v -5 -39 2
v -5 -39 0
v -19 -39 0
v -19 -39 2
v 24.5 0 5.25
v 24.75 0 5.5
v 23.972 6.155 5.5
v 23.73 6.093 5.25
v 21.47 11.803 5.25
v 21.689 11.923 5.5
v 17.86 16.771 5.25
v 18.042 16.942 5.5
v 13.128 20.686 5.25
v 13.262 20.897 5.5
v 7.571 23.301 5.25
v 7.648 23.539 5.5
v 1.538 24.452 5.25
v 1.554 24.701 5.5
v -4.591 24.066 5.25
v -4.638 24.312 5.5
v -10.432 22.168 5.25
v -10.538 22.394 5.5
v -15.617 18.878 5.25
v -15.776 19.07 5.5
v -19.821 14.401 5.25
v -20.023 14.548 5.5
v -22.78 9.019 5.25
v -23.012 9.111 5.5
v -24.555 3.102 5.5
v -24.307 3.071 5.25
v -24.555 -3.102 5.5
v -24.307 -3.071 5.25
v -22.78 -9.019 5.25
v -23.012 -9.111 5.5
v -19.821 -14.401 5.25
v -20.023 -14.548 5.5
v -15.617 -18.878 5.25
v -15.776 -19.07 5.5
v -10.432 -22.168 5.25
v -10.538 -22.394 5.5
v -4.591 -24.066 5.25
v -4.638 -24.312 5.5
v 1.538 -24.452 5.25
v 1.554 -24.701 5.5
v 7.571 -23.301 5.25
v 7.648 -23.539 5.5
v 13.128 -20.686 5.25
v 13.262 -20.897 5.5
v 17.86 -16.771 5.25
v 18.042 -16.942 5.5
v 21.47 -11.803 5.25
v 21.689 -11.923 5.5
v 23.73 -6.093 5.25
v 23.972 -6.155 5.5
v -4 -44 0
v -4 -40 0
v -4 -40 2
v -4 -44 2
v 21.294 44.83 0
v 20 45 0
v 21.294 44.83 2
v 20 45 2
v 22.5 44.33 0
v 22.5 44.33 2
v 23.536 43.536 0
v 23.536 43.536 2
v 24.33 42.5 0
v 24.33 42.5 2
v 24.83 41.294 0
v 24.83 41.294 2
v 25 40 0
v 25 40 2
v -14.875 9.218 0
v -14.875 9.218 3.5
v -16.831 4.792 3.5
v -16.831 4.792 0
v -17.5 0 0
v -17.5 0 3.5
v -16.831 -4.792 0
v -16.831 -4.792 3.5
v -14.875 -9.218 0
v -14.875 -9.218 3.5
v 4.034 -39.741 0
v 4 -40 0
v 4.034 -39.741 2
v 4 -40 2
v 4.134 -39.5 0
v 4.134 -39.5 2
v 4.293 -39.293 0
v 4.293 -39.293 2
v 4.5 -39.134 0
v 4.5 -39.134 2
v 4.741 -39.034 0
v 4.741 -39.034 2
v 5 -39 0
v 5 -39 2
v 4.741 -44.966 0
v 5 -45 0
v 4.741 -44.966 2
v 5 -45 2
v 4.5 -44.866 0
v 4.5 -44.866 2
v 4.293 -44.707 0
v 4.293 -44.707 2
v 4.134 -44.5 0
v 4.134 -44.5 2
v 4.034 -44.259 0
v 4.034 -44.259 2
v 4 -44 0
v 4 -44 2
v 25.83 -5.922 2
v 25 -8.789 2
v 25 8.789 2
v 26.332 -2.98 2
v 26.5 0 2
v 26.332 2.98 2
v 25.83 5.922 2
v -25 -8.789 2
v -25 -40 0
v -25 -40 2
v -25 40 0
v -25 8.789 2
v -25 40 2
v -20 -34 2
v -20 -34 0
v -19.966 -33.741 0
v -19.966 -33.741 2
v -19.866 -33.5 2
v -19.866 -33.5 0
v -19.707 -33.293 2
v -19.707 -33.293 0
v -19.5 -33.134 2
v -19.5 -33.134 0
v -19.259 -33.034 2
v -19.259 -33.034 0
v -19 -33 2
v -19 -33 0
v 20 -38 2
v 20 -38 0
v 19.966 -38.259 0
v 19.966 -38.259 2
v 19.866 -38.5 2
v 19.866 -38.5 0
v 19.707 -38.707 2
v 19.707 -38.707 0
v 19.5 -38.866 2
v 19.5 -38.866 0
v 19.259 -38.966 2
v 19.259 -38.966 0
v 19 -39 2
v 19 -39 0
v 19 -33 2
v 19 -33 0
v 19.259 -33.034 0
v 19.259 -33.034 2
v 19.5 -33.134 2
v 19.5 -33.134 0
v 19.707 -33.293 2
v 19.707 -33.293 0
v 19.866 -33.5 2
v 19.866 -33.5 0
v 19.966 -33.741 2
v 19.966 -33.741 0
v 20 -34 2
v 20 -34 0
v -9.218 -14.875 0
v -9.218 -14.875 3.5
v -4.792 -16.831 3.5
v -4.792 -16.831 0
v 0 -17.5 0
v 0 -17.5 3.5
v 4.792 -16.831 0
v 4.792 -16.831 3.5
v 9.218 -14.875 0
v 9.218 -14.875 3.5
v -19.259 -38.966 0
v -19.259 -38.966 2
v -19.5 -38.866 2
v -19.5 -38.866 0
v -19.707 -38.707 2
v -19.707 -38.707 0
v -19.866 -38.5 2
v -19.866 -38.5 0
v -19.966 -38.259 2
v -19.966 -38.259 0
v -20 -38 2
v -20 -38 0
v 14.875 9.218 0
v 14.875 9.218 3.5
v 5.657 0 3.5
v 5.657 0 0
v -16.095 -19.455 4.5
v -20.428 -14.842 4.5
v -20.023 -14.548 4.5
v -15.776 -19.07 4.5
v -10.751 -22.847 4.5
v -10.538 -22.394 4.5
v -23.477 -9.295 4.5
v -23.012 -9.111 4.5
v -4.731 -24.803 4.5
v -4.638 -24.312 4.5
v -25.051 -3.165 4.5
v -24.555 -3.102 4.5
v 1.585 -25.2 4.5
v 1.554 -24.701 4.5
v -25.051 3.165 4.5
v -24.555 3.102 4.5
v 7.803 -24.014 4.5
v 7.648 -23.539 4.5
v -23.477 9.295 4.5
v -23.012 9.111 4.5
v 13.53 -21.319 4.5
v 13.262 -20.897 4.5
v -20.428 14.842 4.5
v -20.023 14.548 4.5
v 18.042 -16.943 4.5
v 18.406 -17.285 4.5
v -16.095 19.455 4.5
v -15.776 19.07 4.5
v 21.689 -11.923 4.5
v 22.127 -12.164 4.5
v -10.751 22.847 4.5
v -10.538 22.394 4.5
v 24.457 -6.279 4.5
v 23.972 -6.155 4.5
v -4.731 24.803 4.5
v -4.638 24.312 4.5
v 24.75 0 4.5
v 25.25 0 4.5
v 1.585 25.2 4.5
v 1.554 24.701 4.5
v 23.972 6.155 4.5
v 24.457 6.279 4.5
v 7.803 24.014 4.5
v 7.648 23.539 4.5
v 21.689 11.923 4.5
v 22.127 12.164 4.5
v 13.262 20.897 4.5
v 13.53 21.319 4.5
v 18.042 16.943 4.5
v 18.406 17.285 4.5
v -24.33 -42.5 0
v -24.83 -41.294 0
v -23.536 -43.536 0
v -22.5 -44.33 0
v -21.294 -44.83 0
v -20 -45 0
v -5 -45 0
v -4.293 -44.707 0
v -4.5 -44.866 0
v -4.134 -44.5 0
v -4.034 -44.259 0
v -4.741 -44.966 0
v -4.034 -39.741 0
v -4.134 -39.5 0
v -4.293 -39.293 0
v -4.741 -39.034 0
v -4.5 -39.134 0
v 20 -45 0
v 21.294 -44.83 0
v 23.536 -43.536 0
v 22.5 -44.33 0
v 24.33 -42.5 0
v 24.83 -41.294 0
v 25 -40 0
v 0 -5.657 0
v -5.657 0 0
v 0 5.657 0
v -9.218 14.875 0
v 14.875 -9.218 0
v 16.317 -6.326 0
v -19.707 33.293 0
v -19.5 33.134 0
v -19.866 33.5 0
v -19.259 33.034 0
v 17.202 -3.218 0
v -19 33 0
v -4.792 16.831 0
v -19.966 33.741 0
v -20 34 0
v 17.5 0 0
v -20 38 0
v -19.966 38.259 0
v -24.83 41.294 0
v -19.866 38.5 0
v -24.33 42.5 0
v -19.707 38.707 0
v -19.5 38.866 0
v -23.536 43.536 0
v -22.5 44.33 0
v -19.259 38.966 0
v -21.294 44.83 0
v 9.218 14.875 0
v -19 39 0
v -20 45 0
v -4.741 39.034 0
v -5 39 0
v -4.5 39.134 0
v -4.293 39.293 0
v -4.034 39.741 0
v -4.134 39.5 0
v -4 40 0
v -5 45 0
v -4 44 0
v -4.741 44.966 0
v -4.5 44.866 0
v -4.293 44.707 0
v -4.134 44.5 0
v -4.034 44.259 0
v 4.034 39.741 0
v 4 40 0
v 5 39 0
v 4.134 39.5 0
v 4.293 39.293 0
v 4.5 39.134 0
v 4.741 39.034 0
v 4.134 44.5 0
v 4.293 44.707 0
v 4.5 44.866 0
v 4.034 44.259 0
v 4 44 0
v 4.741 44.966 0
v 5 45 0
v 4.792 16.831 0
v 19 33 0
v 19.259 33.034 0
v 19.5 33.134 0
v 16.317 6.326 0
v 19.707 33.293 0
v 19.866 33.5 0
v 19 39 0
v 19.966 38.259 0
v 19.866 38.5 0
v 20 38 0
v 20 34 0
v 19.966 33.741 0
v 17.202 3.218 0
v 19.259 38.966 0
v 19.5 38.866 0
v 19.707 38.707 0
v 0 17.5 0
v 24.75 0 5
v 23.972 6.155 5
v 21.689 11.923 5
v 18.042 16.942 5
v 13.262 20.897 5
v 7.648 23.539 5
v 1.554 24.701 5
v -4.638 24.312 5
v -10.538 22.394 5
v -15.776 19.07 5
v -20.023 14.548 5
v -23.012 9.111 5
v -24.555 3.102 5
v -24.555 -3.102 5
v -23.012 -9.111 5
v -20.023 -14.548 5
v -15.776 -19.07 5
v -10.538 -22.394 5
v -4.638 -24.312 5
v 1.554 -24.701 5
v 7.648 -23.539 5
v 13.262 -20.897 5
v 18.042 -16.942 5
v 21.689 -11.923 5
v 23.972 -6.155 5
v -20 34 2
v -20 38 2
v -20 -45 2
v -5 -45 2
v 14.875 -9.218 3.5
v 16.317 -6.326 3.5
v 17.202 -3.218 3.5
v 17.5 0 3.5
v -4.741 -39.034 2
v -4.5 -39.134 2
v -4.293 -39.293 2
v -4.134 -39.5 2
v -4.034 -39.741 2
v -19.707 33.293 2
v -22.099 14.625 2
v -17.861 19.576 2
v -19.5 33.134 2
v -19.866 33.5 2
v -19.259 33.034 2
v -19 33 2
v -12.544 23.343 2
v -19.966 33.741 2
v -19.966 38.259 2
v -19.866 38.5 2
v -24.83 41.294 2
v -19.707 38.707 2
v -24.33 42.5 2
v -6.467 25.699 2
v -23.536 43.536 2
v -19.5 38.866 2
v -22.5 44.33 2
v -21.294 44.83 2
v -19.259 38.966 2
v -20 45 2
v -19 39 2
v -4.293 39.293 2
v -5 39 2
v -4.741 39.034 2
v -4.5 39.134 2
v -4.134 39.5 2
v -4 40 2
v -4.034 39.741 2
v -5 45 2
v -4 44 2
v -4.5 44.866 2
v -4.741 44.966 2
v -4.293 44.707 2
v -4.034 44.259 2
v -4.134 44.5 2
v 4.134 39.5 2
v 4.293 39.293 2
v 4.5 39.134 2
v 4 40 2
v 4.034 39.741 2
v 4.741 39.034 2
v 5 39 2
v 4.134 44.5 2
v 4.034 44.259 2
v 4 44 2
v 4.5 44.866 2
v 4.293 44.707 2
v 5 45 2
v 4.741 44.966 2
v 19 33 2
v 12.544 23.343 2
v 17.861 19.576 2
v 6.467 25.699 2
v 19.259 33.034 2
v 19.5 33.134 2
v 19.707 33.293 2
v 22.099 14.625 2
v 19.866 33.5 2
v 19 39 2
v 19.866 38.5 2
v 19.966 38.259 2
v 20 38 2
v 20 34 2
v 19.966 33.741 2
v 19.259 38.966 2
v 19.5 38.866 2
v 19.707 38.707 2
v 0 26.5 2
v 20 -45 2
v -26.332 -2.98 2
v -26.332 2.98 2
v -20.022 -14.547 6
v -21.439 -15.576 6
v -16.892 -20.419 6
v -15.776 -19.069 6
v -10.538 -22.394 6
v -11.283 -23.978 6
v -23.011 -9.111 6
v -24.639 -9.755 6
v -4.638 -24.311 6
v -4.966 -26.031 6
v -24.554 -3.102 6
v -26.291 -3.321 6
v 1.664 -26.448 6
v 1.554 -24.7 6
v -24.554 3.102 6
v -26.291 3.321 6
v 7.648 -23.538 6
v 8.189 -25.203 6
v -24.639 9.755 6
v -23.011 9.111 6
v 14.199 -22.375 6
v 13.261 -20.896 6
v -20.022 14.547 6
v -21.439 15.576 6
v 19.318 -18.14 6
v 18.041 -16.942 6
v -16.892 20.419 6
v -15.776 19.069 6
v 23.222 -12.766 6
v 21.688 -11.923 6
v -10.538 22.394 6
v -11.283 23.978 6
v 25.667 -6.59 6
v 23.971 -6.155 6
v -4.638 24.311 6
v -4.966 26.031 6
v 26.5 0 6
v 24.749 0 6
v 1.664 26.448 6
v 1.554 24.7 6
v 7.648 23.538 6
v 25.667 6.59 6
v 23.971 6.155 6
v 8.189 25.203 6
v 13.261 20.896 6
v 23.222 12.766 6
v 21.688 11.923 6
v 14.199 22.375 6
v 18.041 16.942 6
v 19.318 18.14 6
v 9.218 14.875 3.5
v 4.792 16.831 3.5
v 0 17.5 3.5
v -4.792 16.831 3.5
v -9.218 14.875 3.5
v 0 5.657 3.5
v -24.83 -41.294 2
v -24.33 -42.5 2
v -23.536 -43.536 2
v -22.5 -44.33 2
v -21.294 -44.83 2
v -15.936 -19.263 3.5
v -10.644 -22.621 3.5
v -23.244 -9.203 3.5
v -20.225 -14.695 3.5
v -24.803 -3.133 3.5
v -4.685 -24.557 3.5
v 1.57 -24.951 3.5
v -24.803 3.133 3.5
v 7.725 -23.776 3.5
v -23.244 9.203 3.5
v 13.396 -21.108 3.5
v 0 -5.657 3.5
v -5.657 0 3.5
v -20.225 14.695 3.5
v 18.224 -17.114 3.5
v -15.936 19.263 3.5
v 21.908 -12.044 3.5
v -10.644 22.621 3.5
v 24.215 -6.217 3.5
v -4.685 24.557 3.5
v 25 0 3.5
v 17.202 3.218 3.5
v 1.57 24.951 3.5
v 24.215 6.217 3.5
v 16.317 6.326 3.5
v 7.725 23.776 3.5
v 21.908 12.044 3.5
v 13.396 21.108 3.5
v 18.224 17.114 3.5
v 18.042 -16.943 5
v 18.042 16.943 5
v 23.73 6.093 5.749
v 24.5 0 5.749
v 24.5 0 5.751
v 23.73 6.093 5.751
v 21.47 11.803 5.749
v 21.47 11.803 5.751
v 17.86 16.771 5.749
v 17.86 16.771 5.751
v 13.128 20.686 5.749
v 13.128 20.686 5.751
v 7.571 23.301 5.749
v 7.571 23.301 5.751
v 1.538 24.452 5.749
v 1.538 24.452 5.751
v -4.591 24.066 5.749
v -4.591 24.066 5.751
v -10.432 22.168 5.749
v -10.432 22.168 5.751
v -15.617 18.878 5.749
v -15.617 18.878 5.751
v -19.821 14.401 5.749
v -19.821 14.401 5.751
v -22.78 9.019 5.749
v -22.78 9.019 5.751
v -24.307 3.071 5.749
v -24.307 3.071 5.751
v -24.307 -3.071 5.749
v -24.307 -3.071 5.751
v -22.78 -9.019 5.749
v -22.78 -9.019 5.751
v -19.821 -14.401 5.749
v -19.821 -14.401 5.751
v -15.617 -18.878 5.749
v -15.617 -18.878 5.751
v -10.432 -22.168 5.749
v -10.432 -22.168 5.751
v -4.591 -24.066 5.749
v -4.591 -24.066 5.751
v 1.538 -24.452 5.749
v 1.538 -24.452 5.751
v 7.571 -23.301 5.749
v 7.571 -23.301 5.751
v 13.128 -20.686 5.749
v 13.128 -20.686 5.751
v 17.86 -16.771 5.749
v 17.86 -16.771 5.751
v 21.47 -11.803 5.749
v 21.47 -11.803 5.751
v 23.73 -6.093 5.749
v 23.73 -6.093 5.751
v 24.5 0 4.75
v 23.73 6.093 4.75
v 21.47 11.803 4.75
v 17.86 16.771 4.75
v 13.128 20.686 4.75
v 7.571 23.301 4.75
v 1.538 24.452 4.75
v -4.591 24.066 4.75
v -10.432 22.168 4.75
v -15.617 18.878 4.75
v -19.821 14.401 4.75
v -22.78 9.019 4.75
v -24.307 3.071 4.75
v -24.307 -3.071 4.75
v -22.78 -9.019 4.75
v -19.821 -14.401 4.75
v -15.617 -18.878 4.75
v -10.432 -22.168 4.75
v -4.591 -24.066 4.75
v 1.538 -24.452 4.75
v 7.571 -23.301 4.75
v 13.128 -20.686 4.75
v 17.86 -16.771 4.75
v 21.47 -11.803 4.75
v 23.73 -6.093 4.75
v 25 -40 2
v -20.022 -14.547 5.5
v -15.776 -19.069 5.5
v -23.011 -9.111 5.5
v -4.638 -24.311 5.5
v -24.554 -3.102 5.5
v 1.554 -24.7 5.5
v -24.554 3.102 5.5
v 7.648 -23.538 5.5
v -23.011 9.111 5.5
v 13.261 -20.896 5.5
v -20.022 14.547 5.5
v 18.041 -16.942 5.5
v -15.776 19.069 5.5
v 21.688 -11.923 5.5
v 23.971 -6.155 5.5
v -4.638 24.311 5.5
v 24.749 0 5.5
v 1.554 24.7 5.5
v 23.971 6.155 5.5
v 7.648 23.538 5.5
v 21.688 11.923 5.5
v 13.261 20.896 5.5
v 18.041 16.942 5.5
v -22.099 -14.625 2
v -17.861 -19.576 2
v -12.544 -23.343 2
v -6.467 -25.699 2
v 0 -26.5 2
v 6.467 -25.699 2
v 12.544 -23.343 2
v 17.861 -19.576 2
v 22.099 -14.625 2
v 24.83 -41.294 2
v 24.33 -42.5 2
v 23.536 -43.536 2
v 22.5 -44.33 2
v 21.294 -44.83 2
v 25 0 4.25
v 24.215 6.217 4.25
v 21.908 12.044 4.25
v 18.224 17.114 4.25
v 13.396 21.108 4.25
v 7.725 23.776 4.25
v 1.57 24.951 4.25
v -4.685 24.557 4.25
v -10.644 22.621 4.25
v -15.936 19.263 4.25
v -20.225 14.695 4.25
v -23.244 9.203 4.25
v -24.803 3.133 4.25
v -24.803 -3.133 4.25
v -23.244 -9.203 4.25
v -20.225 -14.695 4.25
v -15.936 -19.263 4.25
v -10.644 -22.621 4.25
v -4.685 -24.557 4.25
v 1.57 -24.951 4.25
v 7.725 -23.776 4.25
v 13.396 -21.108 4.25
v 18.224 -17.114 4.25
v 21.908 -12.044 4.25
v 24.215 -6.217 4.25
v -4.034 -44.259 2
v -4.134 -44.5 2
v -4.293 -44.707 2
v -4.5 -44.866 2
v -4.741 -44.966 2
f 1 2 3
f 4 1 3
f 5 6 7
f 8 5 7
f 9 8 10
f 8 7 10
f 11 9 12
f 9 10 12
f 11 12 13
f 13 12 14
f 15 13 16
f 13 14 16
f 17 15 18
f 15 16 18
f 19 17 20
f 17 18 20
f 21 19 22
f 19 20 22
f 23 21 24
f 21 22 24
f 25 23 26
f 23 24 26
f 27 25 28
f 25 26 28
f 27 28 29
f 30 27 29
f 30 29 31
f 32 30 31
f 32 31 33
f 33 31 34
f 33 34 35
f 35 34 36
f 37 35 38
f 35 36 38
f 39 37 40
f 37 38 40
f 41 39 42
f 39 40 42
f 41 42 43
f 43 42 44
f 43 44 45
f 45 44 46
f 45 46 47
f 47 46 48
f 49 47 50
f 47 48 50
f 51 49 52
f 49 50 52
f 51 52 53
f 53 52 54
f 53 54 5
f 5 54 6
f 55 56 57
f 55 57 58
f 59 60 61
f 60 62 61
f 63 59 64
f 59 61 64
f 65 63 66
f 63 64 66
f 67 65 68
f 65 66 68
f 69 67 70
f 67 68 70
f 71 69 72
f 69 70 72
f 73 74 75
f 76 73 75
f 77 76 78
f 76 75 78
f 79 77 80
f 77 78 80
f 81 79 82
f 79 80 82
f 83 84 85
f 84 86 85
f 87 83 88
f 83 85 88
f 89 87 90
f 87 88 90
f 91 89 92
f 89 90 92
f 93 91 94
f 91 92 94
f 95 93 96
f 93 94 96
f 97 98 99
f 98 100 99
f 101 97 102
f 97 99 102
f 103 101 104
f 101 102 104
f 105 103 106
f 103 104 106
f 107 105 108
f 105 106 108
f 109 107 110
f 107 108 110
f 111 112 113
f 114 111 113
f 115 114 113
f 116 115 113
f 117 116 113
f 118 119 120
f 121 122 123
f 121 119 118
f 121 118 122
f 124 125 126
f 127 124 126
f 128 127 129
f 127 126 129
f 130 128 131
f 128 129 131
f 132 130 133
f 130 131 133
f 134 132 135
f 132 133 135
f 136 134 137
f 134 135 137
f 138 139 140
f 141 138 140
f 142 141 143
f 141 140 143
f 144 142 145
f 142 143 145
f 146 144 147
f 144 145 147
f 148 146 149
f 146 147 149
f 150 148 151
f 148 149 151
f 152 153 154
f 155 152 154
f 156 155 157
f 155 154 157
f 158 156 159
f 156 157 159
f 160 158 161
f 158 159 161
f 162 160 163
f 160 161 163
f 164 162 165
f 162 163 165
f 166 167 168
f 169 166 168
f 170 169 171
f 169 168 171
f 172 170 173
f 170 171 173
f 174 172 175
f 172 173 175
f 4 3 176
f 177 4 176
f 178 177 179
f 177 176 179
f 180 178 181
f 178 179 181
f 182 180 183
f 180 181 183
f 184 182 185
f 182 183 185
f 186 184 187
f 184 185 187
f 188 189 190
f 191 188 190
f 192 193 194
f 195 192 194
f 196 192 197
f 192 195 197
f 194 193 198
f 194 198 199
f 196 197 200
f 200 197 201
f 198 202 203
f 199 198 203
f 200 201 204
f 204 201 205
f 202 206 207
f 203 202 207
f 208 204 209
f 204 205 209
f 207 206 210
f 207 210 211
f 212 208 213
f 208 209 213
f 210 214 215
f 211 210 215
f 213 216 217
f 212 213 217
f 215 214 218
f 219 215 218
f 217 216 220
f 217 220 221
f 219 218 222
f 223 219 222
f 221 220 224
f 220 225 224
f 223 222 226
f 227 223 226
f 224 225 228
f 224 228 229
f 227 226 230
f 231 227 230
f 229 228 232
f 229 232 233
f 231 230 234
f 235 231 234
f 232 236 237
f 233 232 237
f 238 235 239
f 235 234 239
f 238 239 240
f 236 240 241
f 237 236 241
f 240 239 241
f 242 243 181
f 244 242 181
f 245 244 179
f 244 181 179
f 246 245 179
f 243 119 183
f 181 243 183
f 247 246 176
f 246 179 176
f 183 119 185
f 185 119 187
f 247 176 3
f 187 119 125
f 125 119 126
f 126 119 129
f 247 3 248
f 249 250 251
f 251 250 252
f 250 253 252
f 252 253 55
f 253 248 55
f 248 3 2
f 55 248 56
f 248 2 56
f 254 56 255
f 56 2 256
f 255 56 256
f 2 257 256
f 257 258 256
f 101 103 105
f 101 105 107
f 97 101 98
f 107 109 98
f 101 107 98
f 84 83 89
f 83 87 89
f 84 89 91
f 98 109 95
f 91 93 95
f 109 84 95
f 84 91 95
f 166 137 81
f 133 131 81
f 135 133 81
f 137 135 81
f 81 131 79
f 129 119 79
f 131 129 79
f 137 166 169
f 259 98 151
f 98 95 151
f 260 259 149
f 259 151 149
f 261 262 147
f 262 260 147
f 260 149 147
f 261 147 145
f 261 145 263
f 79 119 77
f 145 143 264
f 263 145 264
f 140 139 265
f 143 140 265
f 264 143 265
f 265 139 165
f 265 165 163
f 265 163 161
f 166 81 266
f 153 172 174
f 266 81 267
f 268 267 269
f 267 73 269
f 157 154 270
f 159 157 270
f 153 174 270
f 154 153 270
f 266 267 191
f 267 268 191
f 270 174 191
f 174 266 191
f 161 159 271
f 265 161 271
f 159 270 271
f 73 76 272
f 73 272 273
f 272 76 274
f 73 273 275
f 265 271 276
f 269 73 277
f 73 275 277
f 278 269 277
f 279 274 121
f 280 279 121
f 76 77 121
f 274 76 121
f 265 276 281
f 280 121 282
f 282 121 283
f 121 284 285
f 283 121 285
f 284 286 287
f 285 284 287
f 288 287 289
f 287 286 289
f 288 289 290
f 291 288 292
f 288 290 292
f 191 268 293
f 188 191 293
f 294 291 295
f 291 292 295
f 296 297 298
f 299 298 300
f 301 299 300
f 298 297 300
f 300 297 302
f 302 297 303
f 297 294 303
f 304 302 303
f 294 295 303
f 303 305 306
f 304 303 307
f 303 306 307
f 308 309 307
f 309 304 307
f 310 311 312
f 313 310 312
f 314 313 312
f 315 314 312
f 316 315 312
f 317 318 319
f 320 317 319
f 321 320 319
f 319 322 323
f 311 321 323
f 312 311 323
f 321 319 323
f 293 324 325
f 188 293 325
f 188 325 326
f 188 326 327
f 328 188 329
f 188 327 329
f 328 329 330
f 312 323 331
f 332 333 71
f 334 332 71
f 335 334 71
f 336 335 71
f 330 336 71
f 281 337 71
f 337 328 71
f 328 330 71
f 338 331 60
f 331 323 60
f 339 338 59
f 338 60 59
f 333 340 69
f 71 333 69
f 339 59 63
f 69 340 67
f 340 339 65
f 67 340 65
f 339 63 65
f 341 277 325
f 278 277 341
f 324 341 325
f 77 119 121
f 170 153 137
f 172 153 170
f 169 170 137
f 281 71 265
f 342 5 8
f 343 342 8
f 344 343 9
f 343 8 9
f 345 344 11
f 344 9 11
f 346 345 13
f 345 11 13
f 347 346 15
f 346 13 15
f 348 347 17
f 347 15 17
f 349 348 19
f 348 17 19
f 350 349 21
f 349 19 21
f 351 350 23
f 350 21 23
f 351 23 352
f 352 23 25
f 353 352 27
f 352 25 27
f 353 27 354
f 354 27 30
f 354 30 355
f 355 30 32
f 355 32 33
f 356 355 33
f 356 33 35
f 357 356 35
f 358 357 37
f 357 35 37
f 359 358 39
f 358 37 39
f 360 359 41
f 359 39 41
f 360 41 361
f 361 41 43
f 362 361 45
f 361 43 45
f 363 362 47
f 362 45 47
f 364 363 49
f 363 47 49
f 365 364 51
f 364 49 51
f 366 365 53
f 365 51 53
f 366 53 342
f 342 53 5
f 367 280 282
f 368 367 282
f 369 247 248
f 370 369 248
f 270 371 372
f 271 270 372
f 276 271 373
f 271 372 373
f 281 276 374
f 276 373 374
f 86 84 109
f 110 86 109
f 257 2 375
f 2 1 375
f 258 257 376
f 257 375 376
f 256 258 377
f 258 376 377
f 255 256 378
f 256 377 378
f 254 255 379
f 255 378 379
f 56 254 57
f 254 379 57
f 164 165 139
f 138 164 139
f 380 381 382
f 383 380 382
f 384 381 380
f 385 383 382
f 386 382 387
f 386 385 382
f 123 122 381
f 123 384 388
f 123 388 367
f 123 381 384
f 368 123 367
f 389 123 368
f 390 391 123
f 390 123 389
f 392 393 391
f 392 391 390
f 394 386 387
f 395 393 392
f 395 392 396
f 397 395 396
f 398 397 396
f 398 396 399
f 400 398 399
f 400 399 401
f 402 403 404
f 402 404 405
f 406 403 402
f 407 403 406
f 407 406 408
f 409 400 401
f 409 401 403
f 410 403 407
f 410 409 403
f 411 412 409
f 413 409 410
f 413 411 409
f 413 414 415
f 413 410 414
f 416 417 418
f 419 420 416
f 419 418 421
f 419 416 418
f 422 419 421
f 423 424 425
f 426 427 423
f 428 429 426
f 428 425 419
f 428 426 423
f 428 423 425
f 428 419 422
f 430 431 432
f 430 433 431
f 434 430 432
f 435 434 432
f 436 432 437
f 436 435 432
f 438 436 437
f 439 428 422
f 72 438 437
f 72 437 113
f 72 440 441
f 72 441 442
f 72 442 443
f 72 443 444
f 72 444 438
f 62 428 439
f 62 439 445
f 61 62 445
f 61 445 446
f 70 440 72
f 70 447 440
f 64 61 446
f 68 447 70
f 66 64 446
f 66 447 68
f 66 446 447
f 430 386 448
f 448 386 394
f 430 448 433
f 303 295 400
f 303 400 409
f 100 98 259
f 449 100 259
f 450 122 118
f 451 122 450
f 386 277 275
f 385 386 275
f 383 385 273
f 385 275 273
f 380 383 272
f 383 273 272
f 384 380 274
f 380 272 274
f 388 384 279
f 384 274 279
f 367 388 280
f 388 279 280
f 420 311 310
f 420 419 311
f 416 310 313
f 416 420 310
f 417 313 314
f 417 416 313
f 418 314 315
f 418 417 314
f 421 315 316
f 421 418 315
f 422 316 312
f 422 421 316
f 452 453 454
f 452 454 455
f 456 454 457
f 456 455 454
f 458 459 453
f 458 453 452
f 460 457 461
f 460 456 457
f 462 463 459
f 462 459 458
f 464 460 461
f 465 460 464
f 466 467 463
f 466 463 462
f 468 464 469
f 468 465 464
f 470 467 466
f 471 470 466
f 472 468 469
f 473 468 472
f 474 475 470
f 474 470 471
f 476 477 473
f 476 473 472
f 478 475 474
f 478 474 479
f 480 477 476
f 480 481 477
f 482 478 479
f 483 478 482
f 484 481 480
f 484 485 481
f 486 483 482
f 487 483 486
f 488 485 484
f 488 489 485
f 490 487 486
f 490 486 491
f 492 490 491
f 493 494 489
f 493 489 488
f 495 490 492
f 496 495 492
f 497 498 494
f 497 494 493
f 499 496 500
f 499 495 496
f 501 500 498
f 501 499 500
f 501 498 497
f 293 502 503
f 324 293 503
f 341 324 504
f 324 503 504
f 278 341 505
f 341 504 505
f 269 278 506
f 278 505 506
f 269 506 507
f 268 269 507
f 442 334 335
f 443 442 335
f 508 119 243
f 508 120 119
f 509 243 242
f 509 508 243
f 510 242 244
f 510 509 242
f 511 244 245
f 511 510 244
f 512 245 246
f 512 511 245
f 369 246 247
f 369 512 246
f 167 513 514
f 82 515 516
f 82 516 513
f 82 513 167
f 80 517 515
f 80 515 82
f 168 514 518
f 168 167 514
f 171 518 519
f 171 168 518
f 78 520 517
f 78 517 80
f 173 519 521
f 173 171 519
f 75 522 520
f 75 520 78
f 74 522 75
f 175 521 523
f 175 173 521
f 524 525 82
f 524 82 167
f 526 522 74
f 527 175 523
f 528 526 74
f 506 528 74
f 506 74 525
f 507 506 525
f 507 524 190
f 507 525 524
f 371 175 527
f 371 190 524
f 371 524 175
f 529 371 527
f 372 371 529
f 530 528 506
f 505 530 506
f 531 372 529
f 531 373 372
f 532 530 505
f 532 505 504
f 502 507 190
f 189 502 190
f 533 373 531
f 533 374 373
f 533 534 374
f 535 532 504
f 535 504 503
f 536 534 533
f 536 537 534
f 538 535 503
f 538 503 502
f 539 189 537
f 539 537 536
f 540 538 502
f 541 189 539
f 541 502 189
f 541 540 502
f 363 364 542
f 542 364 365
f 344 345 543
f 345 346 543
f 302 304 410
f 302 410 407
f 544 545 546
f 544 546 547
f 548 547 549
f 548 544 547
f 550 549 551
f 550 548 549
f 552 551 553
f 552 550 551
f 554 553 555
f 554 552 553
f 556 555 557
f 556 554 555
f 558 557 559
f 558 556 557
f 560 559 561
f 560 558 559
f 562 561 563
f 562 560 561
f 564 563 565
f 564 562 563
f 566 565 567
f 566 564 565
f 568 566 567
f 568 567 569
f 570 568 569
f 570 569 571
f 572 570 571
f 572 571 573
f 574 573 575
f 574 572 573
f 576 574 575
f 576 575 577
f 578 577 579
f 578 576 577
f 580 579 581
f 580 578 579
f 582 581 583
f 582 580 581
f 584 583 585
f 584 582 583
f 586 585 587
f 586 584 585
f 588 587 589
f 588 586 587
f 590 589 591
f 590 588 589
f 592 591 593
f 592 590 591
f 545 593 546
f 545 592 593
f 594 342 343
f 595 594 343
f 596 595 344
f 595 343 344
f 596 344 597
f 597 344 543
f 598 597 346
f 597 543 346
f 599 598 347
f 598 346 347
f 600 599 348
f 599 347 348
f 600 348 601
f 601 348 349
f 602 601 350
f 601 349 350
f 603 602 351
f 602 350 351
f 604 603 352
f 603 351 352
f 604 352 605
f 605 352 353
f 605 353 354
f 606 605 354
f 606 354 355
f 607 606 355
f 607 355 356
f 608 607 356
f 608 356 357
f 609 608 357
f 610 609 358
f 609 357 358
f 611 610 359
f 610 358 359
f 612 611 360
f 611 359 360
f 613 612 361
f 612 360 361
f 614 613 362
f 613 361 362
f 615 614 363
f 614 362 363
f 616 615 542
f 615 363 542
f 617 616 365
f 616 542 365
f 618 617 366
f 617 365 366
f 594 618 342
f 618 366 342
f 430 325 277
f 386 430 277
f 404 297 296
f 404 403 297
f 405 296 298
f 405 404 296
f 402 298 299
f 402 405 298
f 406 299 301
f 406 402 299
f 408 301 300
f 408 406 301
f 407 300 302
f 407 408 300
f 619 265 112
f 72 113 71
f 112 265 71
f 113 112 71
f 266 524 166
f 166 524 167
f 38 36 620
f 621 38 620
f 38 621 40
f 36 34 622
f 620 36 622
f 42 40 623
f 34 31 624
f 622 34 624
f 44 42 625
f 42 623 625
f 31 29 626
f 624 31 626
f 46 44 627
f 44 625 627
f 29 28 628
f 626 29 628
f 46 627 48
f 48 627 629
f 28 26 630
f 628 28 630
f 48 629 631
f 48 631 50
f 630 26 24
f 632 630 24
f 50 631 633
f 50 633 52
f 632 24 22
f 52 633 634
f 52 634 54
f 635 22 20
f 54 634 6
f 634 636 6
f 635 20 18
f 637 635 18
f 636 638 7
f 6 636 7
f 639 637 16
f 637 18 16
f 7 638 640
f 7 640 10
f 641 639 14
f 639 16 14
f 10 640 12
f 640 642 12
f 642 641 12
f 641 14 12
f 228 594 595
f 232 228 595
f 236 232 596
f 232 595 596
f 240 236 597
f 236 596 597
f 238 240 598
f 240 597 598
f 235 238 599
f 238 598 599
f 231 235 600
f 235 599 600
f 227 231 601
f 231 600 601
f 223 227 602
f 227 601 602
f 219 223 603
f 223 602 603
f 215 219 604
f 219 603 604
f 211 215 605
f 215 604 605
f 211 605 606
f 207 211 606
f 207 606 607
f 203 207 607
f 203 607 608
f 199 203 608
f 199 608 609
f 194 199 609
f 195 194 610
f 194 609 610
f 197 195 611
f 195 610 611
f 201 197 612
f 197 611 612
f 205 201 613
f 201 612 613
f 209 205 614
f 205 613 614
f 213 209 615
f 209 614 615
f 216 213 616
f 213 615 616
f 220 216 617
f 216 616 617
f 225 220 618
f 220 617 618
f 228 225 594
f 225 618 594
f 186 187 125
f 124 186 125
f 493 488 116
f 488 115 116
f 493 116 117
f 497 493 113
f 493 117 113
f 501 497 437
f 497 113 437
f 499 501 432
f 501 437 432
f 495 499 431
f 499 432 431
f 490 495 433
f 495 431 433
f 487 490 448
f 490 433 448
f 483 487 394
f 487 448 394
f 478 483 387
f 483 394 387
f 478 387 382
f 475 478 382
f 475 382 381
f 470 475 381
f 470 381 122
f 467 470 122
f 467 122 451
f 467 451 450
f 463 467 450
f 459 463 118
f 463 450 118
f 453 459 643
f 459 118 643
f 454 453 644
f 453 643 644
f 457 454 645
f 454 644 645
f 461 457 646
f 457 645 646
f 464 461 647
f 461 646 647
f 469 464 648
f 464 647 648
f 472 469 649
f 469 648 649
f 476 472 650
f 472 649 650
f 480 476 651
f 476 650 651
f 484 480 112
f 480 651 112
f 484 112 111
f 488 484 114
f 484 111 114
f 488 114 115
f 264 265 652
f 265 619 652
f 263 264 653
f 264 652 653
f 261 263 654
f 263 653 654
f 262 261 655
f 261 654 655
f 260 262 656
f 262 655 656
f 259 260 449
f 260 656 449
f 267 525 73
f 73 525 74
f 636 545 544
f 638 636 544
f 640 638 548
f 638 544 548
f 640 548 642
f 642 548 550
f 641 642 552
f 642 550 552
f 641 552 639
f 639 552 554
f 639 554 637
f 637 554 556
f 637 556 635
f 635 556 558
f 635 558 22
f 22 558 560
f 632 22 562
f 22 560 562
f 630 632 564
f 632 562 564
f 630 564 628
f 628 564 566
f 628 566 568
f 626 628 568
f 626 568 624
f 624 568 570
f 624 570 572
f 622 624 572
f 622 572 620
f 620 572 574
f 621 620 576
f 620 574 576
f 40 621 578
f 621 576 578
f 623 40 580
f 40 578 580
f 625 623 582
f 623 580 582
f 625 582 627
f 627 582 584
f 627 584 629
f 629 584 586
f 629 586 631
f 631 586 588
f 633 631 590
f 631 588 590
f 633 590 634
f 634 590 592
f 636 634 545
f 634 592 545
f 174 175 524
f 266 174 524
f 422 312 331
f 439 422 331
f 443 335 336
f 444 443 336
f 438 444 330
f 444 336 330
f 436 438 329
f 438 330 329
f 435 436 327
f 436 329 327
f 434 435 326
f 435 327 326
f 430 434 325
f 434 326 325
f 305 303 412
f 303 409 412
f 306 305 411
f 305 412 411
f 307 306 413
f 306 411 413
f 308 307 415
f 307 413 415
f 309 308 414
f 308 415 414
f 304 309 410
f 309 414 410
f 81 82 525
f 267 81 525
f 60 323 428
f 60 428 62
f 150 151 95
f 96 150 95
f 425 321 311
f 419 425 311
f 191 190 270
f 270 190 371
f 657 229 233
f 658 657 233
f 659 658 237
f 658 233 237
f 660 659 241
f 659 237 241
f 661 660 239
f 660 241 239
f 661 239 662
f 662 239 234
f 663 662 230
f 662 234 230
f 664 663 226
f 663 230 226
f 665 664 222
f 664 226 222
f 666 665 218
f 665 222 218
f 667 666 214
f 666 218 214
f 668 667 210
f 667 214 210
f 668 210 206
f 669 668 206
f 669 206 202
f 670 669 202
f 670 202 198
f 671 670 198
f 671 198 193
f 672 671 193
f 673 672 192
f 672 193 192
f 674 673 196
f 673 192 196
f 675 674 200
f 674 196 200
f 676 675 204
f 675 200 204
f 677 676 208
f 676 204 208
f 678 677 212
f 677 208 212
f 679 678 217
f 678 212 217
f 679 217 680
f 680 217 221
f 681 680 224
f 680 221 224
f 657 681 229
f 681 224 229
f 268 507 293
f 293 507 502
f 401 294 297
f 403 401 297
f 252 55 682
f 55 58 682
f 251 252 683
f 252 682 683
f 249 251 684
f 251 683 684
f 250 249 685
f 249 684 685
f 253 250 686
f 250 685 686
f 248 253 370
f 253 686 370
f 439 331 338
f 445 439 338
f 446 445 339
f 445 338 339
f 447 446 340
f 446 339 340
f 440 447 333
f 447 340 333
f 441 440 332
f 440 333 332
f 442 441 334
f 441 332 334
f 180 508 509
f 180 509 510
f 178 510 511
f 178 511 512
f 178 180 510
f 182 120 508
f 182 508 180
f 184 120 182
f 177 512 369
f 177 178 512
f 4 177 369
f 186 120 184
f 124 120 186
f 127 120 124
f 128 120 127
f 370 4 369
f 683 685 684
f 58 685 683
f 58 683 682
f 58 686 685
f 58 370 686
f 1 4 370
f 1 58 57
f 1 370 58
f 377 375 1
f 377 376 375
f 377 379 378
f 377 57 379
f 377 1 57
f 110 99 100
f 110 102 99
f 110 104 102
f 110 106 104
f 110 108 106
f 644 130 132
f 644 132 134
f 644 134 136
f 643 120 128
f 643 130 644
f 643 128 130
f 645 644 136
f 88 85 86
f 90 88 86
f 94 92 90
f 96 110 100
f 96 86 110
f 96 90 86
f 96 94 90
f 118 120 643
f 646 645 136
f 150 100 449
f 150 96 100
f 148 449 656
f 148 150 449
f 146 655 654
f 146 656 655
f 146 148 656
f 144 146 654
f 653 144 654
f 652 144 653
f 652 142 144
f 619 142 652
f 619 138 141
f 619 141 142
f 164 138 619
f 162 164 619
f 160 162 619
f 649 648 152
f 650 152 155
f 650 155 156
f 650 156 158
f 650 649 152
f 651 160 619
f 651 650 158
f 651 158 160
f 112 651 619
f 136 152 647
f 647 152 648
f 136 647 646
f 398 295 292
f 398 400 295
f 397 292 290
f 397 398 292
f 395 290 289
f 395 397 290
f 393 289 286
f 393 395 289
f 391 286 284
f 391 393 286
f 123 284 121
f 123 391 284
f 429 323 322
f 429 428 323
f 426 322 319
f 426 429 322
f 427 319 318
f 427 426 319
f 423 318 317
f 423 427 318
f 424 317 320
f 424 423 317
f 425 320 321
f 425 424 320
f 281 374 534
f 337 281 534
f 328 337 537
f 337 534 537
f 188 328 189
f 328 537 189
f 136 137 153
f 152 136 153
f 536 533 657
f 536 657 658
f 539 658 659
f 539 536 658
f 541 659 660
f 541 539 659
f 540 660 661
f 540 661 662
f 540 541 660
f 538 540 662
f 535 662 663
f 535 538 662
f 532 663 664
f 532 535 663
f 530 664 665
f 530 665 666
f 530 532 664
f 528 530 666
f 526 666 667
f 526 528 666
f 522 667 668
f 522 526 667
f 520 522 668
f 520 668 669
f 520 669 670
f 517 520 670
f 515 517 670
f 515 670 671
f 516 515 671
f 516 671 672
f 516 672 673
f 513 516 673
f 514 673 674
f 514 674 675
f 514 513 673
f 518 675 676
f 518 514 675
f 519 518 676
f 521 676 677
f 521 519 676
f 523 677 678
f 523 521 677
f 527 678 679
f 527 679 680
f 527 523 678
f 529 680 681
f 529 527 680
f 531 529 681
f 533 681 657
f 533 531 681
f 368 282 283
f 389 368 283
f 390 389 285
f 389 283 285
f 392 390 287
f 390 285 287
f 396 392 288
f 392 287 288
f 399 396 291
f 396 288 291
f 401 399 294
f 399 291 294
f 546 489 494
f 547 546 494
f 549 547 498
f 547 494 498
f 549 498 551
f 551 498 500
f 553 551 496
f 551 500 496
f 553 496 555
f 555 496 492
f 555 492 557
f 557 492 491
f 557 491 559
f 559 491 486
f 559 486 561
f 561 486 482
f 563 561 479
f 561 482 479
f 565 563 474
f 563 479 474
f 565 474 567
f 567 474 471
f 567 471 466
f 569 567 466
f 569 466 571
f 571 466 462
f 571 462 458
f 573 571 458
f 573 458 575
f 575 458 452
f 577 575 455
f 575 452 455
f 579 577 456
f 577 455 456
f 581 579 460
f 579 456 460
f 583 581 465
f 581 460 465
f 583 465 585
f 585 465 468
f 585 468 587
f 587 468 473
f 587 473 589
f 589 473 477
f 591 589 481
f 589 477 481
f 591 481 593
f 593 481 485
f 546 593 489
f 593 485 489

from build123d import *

# Parameters (mm, degrees)
F0_W      = 50
F0_H      = 90
F1_DEPTH  = 2
F2_R      = 26.5
F3_DEPTH  = 1.5
F4_R      = 26.5
F4_R_2    = 25
F5_DEPTH  = 1
F6_W      = 3
F6_H      = 70
F7_DEPTH  = 3
F8_DEPTH  = 3
F10_DEPTH = 25
F11_W     = 8
F11_H     = 6
F12_DEPTH = 25
F13_R     = 1
F14_R     = 1
F15_R     = 5
F18_SIZE  = 0.25
F19_R     = 26.5
F19_R_2   = 25.25
F19_R_3   = 24.5
F20_DEPTH = 0.5
F21_SIZE  = 0.24999
F22_R     = 26.5
F22_R_2   = 24.74999
F22_R_3   = 24.5
F23_DEPTH = 0.5
F24_SIZE  = 0.2499
F25_R     = 26.5
F25_R_2   = 24.7499
F25_R_3   = 24.5
F26_DEPTH = 0.5
F27_SIZE  = 0.249


# Not quite as in the source:
# - a fillet or chamfer is up to 0.001 mm smaller than in the source, because OpenCascade refuses the exact size


with BuildPart() as f1:
    # F0 (on Top) → F1 (new body)
    with BuildSketch(Plane.XY):
        Rectangle(F0_W, F0_H)
    extrude(amount=F1_DEPTH)

    # F2 (on face) → F3 (join)
    with BuildSketch(Plane.XY.offset(2)):
        Circle(F2_R)
    extrude(amount=F3_DEPTH)

    # F4 (on face) → F5 (join)
    with BuildSketch(Plane.XY.offset(3.5)):
        Circle(F4_R)
        Circle(F4_R_2, mode=Mode.SUBTRACT)
    extrude(amount=F5_DEPTH)

    # F6 (on face) → F7 (join)
    with BuildSketch(Plane(origin=(0, 0, 0), x_dir=(1, 0, 0), z_dir=(0, 0, -1))):
        with Locations((-23.5, 0)):
            Rectangle(F6_W, F6_H)
        with Locations((23.5, 0)):
            Rectangle(F6_W, F6_H)
    extrude(amount=F7_DEPTH)

    # F8 (cut, through all): faces of the model
    f8_faces = [f1.faces().sort_by_distance(p)[0] for p in [
        (-23.5, 0, -3),
        (23.5, 0, -3),
        (-23.5, 0, -3),
        (23.5, 0, -3),
    ]]
    extrude(f8_faces, amount=-F8_DEPTH, mode=Mode.SUBTRACT)

    # F9 (on face) → F10 (cut)
    with BuildSketch(Plane.XY.offset(3.5)):
        with BuildLine():
            Line((-5.6568542495, 0), (-14.8752109279, 9.2183566784))
            ThreePointArc((-14.8752109279, 9.2183566784), (-17.5, 0), (-14.8752109279, -9.2183566784))
            Line((-14.8752109279, -9.2183566784), (-5.6568542495, 0))
        make_face()
        with BuildLine():
            ThreePointArc((-9.2183566784, -14.8752109279), (0, -17.5), (9.2183566784, -14.8752109279))
            Line((9.2183566784, -14.8752109279), (0, -5.6568542495))
            Line((0, -5.6568542495), (-9.2183566784, -14.8752109279))
        make_face()
        with BuildLine():
            ThreePointArc((14.8752109279, -9.2183566784), (16.831015882, -4.7923798244), (17.5, 0))
            ThreePointArc((17.5, 0), (16.831015882, 4.7923798244), (14.8752109279, 9.2183566784))
            Line((14.8752109279, 9.2183566784), (5.6568542495, 0))
            Line((5.6568542495, 0), (14.8752109279, -9.2183566784))
        make_face()
        with BuildLine():
            Line((0, 5.6568542495), (9.2183566784, 14.8752109279))
            ThreePointArc((9.2183566784, 14.8752109279), (0, 17.5), (-9.2183566784, 14.8752109279))
            Line((-9.2183566784, 14.8752109279), (0, 5.6568542495))
        make_face()
    extrude(amount=-F10_DEPTH, mode=Mode.SUBTRACT)

    # F11 (on face) → F12 (cut)
    with BuildSketch(Plane(origin=(0, 0, 0), x_dir=(1, 0, 0), z_dir=(0, 0, -1))):
        with Locations((0, -42)):
            Rectangle(F11_W, F11_H)
        with BuildLine():
            Line((-4, -39), (4, -39))
            Line((4, -39), (19, -39))
            ThreePointArc((19, -39), (19.7071067812, -38.7071067812), (20, -38))
            Line((20, -38), (20, -34))
            ThreePointArc((20, -34), (19.7071067812, -33.2928932188), (19, -33))
            Line((19, -33), (-19, -33))
            ThreePointArc((-19, -33), (-19.7071067812, -33.2928932188), (-20, -34))
            Line((-20, -34), (-20, -38))
            ThreePointArc((-20, -38), (-19.7071067812, -38.7071067812), (-19, -39))
            Line((-19, -39), (-4, -39))
        make_face()
        with Locations((0, 42)):
            Rectangle(F11_W, F11_H)
        with BuildLine():
            ThreePointArc((20, 38), (19.7071067812, 38.7071067812), (19, 39))
            Line((19, 39), (4, 39))
            Line((4, 39), (-4, 39))
            Line((-4, 39), (-19, 39))
            ThreePointArc((-19, 39), (-19.7071067812, 38.7071067812), (-20, 38))
            Line((-20, 38), (-20, 34))
            ThreePointArc((-20, 34), (-19.7071067812, 33.2928932188), (-19, 33))
            Line((-19, 33), (19, 33))
            ThreePointArc((19, 33), (19.7071067812, 33.2928932188), (20, 34))
            Line((20, 34), (20, 38))
        make_face()
    extrude(amount=-F12_DEPTH, mode=Mode.SUBTRACT)

    # F13
    f13_edges = [f1.edges().sort_by_distance(p)[0] for p in [
        (-4, -45, 1),
        (-4, -39, 1),
        (4, -45, 1),
        (4, -39, 1),
    ]]
    fillet(f13_edges, radius=F13_R)

    # F14
    f14_edges = [f1.edges().sort_by_distance(p)[0] for p in [
        (4, 45, 1),
        (4, 39, 1),
        (-4, 45, 1),
        (-4, 39, 1),
    ]]
    fillet(f14_edges, radius=F14_R)

    # F15
    f15_edges = [f1.edges().sort_by_distance(p)[0] for p in [
        (25, -45, 1),
        (25, 45, 1),
        (-25, 45, 1),
        (-25, -45, 1),
    ]]
    fillet(f15_edges, radius=F15_R)


with BuildPart() as f16_1:
    # F16: copy of F1
    add(f1.part.moved(Location((72.1, 0, 0))))


with BuildPart() as f1_1:
    add(f1.part)

    # F18
    f18_edges = [f1_1.edges().sort_by_distance(p)[0] for p in [
        (-25, 0, 4.5),
    ]]
    chamfer(f18_edges, length=F18_SIZE)

    # F19 (on face) → F20 (join)
    with BuildSketch(Plane.XY.offset(4.5)):
        Circle(F19_R)
        Circle(F19_R_2, mode=Mode.SUBTRACT)
        Circle(F19_R_2)
        Circle(F19_R_3, mode=Mode.SUBTRACT)
    extrude(amount=F20_DEPTH)

    # F21 (size 0.25 in the source; OpenCascade refuses exactly that, so slightly less here)
    f21_edges = [f1_1.edges().sort_by_distance(p)[0] for p in [
        (-24.5, 0, 4.5),
        (-24.5, 0, 5),
    ]]
    chamfer(f21_edges, length=F21_SIZE)

    # F22 (on face) → F23 (join)
    with BuildSketch(Plane.XY.offset(5)):
        Circle(F22_R)
        Circle(F22_R_2, mode=Mode.SUBTRACT)
        Circle(F22_R_2)
        Circle(F22_R_3, mode=Mode.SUBTRACT)
    extrude(amount=F23_DEPTH)

    # F24 (size 0.25 in the source; OpenCascade refuses exactly that, so slightly less here)
    f24_edges = [f1_1.edges().sort_by_distance(p)[0] for p in [
        (-24.5, 0, 5),
        (-24.5, 0, 5.5),
    ]]
    chamfer(f24_edges, length=F24_SIZE)

    # F25 (on face) → F26 (join)
    with BuildSketch(Plane.XY.offset(5.5)):
        Circle(F25_R)
        Circle(F25_R_2, mode=Mode.SUBTRACT)
        Circle(F25_R_2)
        Circle(F25_R_3, mode=Mode.SUBTRACT)
    extrude(amount=F26_DEPTH)

    # F27 (size 0.25 in the source; OpenCascade refuses exactly that, so slightly less here)
    f27_edges = [f1_1.edges().sort_by_distance(p)[0] for p in [
        (-24.5, 0, 6),
        (-24.5, 0, 5.5),
    ]]
    chamfer(f27_edges, length=F27_SIZE)


solid = f1_1.part
